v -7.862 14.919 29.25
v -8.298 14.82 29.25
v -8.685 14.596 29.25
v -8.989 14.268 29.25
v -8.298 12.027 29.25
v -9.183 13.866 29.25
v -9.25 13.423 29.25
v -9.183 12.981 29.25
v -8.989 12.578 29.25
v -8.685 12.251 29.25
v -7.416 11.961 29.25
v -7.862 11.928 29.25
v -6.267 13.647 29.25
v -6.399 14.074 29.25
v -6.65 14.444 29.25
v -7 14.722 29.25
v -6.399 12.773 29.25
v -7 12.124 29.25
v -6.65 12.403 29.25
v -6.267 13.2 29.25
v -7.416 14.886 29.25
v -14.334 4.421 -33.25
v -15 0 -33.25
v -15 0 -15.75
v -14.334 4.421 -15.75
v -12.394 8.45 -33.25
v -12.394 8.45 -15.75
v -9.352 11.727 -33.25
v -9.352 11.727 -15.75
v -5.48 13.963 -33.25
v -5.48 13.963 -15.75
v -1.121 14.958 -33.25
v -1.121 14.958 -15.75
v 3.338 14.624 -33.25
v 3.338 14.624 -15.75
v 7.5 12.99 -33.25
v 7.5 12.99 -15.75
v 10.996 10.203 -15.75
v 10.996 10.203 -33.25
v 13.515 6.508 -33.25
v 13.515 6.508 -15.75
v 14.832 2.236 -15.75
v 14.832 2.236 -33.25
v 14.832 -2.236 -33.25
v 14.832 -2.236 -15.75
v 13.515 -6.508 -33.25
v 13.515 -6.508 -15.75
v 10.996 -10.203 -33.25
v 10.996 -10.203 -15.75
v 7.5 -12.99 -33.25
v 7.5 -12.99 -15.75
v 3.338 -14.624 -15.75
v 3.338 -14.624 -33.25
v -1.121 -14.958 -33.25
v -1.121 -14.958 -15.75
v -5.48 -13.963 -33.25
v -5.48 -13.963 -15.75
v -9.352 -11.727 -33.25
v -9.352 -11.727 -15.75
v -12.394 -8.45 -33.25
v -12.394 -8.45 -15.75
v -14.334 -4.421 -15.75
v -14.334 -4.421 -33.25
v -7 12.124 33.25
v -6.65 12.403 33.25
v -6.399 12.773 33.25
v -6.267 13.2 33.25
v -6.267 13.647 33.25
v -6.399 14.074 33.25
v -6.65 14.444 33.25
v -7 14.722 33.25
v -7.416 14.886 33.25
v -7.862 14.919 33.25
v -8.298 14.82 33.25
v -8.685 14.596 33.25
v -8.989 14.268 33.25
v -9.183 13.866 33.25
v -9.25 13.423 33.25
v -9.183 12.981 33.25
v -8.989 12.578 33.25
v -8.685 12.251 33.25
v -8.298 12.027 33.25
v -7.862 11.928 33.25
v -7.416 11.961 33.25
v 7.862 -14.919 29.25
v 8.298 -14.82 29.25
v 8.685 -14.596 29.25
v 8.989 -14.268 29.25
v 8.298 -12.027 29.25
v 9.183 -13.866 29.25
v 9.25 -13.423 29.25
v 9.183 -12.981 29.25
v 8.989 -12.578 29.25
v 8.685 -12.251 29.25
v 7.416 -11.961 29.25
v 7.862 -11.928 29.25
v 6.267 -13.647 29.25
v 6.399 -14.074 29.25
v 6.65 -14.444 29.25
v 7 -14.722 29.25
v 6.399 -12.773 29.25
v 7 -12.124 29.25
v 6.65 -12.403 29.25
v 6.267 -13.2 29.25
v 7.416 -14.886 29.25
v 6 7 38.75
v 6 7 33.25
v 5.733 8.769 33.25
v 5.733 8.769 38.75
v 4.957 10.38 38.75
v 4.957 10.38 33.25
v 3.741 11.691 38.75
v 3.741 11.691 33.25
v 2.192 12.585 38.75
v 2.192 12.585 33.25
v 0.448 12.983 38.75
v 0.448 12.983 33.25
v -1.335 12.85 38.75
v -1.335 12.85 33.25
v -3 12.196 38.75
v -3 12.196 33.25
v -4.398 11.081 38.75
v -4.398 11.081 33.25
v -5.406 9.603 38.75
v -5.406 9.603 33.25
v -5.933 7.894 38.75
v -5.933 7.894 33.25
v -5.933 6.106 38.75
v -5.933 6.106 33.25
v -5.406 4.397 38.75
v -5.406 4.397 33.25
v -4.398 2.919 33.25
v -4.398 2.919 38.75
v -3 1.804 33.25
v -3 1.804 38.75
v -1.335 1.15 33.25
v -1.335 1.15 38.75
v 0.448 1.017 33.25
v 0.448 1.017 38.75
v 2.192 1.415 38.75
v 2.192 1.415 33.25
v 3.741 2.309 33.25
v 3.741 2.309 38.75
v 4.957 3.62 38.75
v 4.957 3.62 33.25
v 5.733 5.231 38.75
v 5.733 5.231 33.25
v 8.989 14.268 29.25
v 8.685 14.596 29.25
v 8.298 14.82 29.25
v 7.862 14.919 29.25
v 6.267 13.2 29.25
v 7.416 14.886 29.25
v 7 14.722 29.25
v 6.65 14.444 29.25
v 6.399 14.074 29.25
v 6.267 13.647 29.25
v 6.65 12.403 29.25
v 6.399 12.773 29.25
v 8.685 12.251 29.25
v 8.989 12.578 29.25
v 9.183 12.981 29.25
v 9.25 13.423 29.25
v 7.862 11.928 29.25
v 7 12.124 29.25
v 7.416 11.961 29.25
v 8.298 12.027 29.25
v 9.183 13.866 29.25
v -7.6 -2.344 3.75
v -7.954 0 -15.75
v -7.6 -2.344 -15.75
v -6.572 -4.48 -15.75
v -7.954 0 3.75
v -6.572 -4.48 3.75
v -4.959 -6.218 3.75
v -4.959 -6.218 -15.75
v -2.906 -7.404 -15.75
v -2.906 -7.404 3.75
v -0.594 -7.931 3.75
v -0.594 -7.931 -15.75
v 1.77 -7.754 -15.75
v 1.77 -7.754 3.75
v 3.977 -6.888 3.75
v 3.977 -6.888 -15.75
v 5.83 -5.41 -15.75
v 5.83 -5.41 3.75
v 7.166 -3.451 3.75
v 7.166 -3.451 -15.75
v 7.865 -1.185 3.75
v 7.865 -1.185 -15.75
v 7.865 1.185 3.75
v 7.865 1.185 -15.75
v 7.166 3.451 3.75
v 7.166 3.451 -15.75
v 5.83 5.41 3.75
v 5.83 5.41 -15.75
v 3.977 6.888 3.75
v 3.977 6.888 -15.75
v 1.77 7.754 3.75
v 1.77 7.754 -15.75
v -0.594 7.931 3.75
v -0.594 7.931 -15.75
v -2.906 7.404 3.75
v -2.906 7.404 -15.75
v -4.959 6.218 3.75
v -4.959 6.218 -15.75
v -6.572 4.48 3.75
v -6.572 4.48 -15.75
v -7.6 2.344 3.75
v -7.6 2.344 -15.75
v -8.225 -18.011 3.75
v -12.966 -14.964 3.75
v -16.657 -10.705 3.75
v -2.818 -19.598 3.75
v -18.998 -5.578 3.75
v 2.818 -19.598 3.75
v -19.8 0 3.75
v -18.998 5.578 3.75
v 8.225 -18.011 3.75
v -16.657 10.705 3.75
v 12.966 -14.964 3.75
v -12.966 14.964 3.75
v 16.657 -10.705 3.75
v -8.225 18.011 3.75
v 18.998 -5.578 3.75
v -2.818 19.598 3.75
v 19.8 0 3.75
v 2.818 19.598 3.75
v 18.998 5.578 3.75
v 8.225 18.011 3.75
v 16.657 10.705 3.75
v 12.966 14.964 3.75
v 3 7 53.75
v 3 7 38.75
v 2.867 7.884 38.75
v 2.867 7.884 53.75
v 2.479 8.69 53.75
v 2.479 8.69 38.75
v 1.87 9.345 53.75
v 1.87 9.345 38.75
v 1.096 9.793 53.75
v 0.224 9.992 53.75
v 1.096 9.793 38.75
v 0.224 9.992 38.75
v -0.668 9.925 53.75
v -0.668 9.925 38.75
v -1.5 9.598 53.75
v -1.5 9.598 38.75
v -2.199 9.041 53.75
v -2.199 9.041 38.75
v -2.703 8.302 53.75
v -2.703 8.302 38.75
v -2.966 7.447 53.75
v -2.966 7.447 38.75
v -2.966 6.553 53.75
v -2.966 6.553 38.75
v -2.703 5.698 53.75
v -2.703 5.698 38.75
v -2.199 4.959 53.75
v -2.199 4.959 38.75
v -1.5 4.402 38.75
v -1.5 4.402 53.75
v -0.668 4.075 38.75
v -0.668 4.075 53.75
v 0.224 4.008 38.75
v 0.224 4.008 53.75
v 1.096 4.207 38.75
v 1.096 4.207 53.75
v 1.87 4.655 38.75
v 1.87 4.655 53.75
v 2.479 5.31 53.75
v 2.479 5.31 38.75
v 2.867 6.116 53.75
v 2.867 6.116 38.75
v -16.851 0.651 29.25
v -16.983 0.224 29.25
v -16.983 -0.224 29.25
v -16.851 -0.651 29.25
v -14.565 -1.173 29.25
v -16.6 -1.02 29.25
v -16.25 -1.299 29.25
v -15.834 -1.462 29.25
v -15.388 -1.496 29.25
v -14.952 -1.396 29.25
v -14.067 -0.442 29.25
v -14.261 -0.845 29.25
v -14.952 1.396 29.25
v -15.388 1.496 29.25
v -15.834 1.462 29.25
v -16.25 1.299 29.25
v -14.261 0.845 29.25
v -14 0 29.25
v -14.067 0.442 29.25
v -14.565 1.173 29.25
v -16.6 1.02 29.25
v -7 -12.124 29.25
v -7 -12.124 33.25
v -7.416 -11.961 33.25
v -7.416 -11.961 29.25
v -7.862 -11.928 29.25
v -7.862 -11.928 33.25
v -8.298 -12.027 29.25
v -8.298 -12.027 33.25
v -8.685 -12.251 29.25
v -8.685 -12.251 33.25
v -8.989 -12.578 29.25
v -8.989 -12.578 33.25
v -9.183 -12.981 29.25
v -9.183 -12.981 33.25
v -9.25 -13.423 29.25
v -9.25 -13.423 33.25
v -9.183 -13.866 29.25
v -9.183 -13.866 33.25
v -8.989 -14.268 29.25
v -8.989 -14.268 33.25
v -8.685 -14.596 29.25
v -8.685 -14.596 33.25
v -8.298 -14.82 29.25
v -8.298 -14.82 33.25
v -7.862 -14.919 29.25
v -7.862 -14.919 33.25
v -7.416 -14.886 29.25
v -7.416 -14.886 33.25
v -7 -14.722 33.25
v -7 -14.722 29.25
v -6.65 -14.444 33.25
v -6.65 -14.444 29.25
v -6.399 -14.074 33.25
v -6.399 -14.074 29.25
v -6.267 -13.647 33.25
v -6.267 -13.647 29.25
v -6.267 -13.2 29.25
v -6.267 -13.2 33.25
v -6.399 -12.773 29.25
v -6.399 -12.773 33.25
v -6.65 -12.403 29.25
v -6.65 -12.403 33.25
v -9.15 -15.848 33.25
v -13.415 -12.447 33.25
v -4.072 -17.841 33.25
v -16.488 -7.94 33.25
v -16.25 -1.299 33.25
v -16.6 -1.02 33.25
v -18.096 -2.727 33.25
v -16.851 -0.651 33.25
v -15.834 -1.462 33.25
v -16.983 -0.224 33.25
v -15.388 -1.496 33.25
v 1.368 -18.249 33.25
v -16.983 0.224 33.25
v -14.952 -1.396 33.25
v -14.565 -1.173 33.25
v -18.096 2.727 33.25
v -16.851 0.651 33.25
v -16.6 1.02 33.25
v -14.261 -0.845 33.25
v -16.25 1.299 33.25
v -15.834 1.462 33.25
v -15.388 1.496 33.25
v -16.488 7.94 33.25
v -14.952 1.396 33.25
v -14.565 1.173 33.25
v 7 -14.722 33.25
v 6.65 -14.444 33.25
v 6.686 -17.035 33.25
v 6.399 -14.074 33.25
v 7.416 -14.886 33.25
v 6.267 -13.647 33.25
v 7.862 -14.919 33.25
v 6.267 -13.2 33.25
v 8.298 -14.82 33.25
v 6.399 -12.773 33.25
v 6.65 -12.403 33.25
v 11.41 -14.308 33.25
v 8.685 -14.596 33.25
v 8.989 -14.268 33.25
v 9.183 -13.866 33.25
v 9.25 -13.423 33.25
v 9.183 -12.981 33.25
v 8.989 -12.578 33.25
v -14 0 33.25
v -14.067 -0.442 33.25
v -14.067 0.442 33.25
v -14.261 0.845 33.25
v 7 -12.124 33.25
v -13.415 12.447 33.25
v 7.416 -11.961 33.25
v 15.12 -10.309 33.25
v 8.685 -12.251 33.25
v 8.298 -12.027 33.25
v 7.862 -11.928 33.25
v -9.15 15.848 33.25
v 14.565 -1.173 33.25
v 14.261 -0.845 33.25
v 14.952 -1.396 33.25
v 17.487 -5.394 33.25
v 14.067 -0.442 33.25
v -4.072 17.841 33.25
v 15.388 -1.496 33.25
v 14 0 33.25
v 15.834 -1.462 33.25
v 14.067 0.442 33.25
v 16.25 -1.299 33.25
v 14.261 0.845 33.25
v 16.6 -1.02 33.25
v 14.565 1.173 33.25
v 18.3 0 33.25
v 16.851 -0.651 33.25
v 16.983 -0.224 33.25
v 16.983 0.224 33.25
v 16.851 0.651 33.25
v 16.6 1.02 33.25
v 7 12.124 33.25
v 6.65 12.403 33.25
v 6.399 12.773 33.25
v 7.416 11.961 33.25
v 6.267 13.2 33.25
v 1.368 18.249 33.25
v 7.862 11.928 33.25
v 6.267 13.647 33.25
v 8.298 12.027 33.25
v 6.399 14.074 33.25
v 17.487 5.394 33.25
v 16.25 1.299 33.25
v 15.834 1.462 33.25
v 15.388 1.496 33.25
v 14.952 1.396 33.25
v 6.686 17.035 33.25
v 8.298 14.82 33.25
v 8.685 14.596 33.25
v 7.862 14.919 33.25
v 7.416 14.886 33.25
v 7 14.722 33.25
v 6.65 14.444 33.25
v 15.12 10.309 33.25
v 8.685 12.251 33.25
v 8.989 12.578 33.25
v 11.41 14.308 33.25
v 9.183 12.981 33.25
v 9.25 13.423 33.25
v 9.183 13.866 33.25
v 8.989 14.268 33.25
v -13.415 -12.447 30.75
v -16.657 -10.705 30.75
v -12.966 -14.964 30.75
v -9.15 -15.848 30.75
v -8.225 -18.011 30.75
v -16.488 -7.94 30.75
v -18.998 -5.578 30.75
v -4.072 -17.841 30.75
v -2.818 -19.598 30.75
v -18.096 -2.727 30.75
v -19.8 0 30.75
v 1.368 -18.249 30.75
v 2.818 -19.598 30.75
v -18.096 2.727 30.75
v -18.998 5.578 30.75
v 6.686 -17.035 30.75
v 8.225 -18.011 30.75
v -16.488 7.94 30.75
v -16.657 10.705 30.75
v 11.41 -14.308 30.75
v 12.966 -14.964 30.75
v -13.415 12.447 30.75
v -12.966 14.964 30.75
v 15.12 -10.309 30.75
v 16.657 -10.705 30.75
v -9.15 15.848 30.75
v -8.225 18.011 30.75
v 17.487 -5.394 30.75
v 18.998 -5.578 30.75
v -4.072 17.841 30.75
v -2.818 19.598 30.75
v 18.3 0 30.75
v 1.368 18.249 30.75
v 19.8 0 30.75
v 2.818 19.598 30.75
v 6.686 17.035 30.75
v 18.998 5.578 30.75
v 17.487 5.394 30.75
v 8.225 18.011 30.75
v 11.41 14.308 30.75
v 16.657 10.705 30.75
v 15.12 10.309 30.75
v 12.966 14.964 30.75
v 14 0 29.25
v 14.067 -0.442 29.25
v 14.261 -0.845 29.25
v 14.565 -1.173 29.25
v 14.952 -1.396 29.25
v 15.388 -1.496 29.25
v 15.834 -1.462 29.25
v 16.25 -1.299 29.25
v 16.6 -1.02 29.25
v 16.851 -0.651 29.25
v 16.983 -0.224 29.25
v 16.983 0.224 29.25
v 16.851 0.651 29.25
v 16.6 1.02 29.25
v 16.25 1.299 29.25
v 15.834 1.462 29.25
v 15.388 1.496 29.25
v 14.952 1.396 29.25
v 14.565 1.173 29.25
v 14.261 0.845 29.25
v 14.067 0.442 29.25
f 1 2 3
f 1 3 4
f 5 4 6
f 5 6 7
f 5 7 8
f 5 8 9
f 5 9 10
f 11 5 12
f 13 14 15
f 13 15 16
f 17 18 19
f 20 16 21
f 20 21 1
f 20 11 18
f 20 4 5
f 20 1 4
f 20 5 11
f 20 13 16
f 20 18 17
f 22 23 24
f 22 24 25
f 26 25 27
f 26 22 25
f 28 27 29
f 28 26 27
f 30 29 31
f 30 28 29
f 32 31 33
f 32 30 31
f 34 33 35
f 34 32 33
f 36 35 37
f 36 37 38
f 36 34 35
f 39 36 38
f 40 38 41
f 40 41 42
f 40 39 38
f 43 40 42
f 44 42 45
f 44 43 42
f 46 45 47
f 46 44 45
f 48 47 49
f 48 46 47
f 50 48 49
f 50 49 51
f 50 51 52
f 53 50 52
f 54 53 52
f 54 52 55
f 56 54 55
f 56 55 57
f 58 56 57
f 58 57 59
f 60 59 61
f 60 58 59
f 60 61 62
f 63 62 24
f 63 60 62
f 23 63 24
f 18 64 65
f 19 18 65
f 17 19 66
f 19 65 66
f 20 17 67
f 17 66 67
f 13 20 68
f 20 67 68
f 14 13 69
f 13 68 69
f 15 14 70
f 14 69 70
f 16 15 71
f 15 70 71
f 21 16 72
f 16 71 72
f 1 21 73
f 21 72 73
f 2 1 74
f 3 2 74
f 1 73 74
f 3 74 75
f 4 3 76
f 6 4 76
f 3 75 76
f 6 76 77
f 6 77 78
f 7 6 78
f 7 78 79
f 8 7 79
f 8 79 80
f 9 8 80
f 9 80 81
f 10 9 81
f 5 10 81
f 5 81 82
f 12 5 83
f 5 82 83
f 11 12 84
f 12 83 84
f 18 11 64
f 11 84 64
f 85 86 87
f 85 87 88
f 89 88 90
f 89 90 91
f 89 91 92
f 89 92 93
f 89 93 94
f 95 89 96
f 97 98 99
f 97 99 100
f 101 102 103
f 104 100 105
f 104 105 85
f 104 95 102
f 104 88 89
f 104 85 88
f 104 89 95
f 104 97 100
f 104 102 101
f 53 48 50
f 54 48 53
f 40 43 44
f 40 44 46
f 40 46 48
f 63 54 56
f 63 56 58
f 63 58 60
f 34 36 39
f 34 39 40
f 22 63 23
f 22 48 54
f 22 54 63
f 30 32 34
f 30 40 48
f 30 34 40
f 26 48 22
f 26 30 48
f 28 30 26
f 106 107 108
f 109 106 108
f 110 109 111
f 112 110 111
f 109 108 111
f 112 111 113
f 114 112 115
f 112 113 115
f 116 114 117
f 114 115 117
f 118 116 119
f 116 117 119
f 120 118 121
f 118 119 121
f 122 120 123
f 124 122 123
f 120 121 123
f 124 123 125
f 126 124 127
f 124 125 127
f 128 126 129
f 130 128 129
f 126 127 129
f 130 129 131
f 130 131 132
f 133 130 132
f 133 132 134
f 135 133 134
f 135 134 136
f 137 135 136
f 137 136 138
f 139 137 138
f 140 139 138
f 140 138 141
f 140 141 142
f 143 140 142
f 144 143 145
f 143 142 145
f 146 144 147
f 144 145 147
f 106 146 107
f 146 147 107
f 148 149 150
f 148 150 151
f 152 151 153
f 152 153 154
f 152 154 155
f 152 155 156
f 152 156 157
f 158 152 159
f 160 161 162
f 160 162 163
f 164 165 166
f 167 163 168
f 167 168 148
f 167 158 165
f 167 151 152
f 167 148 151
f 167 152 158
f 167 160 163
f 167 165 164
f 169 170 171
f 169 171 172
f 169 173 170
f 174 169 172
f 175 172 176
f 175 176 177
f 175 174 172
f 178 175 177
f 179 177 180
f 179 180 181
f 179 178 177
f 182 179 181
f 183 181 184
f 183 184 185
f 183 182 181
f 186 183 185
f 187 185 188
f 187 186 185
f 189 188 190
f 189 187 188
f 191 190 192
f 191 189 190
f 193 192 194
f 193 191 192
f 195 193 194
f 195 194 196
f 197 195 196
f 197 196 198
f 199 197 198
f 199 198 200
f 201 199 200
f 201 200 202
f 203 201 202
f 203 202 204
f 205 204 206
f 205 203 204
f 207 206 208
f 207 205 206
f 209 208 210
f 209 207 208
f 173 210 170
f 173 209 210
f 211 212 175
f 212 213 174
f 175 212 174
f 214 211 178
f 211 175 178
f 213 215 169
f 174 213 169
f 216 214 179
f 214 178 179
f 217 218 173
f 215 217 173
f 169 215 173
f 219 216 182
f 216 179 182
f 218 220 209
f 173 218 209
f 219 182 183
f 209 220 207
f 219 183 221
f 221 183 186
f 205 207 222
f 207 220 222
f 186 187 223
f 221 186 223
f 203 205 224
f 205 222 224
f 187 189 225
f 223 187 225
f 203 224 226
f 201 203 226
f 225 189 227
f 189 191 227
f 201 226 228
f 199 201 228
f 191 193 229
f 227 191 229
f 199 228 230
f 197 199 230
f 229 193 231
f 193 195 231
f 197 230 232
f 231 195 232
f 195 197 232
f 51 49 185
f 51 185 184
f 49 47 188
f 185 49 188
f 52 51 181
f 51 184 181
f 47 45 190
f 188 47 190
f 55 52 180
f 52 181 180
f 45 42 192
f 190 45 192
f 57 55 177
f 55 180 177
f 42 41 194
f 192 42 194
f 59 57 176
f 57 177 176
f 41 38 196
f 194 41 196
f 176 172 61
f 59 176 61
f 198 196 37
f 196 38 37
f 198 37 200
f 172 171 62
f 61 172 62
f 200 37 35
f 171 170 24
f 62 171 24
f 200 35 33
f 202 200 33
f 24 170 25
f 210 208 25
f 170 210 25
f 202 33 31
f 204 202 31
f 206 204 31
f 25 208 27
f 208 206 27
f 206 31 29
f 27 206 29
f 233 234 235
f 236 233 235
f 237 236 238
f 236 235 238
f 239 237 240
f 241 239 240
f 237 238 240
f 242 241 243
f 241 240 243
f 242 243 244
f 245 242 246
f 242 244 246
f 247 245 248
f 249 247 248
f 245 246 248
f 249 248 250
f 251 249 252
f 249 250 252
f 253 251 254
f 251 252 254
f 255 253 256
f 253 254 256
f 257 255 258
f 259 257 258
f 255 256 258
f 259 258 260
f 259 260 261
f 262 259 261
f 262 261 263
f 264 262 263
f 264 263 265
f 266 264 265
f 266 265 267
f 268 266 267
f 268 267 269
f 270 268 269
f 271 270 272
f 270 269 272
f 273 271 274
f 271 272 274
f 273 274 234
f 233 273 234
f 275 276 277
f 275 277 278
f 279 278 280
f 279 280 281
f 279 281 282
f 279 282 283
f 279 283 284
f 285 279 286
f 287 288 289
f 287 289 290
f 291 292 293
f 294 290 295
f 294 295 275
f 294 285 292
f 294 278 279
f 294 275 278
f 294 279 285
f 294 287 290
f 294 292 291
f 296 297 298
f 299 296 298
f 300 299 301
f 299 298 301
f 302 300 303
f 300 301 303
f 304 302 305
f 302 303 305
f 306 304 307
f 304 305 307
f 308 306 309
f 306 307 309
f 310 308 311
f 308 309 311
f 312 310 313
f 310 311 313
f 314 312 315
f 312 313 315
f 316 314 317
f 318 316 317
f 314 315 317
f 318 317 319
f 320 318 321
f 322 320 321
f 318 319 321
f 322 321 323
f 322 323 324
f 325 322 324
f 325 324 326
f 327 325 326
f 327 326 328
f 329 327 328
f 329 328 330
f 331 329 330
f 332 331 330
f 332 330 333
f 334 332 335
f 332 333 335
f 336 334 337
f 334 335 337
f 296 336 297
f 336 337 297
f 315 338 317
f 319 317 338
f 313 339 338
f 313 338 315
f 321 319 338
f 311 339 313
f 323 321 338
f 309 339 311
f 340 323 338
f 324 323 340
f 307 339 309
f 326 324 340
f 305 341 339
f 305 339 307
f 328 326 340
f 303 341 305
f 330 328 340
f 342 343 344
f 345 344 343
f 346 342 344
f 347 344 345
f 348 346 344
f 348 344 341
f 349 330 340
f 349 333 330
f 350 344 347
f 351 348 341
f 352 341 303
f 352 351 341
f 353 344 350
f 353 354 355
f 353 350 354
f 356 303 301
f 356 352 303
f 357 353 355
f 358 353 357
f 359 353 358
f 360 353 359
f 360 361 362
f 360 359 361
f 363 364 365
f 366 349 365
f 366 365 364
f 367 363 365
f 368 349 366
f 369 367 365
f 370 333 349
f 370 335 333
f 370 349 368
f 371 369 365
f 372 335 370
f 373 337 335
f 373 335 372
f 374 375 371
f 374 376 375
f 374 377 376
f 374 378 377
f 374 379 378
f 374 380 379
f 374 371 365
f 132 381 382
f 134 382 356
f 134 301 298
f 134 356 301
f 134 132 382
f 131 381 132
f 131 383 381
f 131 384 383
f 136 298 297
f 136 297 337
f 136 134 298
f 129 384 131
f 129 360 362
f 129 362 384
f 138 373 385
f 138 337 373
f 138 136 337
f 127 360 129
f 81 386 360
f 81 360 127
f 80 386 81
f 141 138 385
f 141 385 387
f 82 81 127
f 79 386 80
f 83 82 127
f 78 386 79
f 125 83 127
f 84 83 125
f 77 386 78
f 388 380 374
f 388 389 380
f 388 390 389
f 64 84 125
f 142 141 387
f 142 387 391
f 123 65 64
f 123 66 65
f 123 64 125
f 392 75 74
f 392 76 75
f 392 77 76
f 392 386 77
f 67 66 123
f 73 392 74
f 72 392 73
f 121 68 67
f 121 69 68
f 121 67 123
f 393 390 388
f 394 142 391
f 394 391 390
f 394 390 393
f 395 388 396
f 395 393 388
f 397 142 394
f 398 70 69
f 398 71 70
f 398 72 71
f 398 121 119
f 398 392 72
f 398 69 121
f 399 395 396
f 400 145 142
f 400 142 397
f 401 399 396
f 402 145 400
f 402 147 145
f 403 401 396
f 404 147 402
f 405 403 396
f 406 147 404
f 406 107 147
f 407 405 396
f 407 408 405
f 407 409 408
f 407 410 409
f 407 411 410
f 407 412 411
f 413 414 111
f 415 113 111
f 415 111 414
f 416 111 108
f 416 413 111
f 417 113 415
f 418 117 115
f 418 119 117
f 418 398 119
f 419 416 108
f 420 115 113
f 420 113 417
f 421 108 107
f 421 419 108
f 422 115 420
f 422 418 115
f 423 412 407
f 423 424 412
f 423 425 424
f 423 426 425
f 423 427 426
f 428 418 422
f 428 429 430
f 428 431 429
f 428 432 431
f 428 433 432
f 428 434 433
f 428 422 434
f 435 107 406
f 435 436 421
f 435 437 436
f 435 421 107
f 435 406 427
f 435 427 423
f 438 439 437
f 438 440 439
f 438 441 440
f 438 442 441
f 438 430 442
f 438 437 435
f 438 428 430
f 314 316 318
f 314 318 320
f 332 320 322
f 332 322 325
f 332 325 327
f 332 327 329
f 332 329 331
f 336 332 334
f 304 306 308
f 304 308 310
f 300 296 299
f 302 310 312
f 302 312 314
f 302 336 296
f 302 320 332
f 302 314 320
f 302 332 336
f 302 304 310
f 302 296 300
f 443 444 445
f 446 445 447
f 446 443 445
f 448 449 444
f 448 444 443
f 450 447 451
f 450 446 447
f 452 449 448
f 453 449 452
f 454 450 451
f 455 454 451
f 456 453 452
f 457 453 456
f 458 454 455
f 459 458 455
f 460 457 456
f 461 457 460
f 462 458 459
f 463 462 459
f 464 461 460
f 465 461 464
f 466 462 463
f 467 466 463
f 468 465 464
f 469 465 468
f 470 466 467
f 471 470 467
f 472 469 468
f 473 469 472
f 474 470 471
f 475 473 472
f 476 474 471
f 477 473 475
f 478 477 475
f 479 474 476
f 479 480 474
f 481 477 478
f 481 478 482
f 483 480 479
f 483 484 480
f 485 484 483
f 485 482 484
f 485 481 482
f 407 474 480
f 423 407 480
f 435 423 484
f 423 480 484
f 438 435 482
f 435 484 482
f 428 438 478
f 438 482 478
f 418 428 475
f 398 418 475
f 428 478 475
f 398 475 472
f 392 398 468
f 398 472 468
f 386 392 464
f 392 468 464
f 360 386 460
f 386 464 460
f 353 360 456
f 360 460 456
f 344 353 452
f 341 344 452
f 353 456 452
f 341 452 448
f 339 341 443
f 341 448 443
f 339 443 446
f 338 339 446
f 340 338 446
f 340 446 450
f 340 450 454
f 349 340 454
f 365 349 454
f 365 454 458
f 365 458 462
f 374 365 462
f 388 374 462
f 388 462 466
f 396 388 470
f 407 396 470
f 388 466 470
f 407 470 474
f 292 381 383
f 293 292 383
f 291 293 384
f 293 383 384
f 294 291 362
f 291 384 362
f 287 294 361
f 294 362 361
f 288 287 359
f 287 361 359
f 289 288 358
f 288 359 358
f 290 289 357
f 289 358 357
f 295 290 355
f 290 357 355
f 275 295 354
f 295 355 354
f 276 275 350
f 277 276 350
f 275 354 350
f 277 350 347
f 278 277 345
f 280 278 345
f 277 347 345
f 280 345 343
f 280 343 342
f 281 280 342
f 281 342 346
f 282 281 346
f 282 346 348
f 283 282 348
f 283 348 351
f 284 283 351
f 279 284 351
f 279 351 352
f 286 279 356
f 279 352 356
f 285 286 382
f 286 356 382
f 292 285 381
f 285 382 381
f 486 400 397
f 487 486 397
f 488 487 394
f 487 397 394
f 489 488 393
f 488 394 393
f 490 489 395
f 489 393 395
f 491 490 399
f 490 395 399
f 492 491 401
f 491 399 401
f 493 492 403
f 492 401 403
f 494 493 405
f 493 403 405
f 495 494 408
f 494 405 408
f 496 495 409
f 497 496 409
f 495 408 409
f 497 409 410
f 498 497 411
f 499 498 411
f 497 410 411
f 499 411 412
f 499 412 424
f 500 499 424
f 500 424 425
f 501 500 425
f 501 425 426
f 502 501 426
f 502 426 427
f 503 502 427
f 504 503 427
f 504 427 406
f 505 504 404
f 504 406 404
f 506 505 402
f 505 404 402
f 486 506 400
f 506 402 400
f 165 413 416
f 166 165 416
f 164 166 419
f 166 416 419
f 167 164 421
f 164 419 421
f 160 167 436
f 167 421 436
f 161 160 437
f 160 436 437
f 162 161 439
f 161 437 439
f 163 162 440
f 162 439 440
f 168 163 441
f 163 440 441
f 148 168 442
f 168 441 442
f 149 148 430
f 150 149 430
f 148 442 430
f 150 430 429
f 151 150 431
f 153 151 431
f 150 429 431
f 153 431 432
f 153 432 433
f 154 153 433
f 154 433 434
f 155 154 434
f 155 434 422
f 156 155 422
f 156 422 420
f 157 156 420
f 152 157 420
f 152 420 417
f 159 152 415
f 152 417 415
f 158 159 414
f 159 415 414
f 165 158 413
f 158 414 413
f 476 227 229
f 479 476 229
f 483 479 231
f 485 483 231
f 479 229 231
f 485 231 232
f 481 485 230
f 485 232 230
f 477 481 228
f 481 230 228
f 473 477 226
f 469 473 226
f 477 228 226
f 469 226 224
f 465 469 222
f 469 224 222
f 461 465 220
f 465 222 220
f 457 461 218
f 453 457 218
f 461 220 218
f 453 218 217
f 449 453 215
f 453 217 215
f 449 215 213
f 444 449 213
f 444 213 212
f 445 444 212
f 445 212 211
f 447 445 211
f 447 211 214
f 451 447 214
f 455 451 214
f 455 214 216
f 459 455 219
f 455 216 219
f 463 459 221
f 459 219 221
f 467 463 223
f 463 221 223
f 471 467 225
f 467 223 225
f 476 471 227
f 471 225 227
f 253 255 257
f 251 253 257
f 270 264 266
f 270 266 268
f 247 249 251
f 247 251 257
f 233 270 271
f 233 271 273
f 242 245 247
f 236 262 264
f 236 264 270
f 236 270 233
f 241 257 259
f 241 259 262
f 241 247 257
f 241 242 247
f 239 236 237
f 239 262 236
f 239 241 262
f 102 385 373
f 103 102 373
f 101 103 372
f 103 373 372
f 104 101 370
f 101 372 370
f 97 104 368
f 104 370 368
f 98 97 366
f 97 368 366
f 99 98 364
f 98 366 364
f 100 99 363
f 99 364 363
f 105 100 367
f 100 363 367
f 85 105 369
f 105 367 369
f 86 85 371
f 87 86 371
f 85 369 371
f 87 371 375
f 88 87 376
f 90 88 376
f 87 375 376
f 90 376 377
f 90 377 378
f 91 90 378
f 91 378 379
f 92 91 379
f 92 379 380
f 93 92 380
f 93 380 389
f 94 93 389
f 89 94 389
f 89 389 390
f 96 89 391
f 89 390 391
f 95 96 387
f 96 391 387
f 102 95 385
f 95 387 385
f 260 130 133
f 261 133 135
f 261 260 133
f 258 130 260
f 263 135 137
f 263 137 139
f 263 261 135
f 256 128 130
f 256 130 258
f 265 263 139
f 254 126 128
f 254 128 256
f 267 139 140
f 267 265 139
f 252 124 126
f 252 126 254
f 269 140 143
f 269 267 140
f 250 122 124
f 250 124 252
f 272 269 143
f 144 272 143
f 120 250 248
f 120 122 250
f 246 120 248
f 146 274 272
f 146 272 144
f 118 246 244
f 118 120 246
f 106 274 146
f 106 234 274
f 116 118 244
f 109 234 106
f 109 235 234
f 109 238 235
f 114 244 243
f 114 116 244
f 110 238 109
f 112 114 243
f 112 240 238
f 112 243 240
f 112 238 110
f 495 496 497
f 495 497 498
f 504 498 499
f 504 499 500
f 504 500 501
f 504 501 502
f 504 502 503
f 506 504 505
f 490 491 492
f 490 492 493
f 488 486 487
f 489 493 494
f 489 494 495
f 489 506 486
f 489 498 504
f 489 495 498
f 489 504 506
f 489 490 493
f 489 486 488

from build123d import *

# Parameters (mm, degrees)
SKETCH4_R           = 7.953728713
BOSS_EXTRUDE4_DEPTH = 33.25
SKETCH5_R           = 18.3
BOSS_EXTRUDE5_DEPTH = 2.5
SKETCH5_3_R         = 19.8
BOSS_EXTRUDE6_DEPTH = 27
SKETCH6_R           = 15
BOSS_EXTRUDE7_DEPTH = 17.5
SKETCH7_R           = 6
BOSS_EXTRUDE8_DEPTH = 5.5
SKETCH9_R           = 3
BOSS_EXTRUDE9_DEPTH = 15
SKETCH10_R          = 1.5
CUT_EXTRUDE1_DEPTH  = 4
CIRPATTERN1_COUNT   = 6


with BuildPart() as part:
    # Sketch4 → Boss-Extrude4 (new, symmetric)
    with BuildSketch(Plane.XY):
        Circle(SKETCH4_R)
    extrude(amount=BOSS_EXTRUDE4_DEPTH, both=True)

    # Sketch5 → Boss-Extrude5 (add)
    with BuildSketch(Plane.XY.offset(30.75)):
        Circle(SKETCH5_R)
    extrude(amount=BOSS_EXTRUDE5_DEPTH)

    # Sketch5<3> → Boss-Extrude6 (add)
    with BuildSketch(Plane.XY.offset(30.75)):
        Circle(SKETCH5_3_R)
    extrude(amount=-BOSS_EXTRUDE6_DEPTH)

    # Sketch6 → Boss-Extrude7 (add)
    with BuildSketch(Plane(origin=(0, 0, -33.25), x_dir=(-1, 0, 0), z_dir=(0, 0, -1))):
        Circle(SKETCH6_R)
    extrude(amount=-BOSS_EXTRUDE7_DEPTH)

    # Sketch7 → Boss-Extrude8 (add)
    with BuildSketch(Plane.XY.offset(33.25)):
        with Locations((0, 7)):
            Circle(SKETCH7_R)
    extrude(amount=BOSS_EXTRUDE8_DEPTH)

    # Sketch9 → Boss-Extrude9 (add)
    with BuildSketch(Plane.XY.offset(38.75)):
        with Locations((0, 7)):
            Circle(SKETCH9_R)
    extrude(amount=BOSS_EXTRUDE9_DEPTH)

    # Sketch10 → Cut-Extrude1 (cut)
    with BuildSketch(Plane.XY.offset(33.25)):
        with Locations((-15.5, 0)):
            Circle(SKETCH10_R)
    cut_extrude1 = extrude(amount=-CUT_EXTRUDE1_DEPTH, mode=Mode.SUBTRACT)

    # CirPattern1: Cut-Extrude1 ×6 about axis
    cirpattern1_axis = Axis((0, 0, 64.697513325), (0, 0, -1))
    for i in range(1, CIRPATTERN1_COUNT):
        add(cut_extrude1.rotate(cirpattern1_axis, i * 360 / CIRPATTERN1_COUNT), mode=Mode.SUBTRACT)


solid = part.part
